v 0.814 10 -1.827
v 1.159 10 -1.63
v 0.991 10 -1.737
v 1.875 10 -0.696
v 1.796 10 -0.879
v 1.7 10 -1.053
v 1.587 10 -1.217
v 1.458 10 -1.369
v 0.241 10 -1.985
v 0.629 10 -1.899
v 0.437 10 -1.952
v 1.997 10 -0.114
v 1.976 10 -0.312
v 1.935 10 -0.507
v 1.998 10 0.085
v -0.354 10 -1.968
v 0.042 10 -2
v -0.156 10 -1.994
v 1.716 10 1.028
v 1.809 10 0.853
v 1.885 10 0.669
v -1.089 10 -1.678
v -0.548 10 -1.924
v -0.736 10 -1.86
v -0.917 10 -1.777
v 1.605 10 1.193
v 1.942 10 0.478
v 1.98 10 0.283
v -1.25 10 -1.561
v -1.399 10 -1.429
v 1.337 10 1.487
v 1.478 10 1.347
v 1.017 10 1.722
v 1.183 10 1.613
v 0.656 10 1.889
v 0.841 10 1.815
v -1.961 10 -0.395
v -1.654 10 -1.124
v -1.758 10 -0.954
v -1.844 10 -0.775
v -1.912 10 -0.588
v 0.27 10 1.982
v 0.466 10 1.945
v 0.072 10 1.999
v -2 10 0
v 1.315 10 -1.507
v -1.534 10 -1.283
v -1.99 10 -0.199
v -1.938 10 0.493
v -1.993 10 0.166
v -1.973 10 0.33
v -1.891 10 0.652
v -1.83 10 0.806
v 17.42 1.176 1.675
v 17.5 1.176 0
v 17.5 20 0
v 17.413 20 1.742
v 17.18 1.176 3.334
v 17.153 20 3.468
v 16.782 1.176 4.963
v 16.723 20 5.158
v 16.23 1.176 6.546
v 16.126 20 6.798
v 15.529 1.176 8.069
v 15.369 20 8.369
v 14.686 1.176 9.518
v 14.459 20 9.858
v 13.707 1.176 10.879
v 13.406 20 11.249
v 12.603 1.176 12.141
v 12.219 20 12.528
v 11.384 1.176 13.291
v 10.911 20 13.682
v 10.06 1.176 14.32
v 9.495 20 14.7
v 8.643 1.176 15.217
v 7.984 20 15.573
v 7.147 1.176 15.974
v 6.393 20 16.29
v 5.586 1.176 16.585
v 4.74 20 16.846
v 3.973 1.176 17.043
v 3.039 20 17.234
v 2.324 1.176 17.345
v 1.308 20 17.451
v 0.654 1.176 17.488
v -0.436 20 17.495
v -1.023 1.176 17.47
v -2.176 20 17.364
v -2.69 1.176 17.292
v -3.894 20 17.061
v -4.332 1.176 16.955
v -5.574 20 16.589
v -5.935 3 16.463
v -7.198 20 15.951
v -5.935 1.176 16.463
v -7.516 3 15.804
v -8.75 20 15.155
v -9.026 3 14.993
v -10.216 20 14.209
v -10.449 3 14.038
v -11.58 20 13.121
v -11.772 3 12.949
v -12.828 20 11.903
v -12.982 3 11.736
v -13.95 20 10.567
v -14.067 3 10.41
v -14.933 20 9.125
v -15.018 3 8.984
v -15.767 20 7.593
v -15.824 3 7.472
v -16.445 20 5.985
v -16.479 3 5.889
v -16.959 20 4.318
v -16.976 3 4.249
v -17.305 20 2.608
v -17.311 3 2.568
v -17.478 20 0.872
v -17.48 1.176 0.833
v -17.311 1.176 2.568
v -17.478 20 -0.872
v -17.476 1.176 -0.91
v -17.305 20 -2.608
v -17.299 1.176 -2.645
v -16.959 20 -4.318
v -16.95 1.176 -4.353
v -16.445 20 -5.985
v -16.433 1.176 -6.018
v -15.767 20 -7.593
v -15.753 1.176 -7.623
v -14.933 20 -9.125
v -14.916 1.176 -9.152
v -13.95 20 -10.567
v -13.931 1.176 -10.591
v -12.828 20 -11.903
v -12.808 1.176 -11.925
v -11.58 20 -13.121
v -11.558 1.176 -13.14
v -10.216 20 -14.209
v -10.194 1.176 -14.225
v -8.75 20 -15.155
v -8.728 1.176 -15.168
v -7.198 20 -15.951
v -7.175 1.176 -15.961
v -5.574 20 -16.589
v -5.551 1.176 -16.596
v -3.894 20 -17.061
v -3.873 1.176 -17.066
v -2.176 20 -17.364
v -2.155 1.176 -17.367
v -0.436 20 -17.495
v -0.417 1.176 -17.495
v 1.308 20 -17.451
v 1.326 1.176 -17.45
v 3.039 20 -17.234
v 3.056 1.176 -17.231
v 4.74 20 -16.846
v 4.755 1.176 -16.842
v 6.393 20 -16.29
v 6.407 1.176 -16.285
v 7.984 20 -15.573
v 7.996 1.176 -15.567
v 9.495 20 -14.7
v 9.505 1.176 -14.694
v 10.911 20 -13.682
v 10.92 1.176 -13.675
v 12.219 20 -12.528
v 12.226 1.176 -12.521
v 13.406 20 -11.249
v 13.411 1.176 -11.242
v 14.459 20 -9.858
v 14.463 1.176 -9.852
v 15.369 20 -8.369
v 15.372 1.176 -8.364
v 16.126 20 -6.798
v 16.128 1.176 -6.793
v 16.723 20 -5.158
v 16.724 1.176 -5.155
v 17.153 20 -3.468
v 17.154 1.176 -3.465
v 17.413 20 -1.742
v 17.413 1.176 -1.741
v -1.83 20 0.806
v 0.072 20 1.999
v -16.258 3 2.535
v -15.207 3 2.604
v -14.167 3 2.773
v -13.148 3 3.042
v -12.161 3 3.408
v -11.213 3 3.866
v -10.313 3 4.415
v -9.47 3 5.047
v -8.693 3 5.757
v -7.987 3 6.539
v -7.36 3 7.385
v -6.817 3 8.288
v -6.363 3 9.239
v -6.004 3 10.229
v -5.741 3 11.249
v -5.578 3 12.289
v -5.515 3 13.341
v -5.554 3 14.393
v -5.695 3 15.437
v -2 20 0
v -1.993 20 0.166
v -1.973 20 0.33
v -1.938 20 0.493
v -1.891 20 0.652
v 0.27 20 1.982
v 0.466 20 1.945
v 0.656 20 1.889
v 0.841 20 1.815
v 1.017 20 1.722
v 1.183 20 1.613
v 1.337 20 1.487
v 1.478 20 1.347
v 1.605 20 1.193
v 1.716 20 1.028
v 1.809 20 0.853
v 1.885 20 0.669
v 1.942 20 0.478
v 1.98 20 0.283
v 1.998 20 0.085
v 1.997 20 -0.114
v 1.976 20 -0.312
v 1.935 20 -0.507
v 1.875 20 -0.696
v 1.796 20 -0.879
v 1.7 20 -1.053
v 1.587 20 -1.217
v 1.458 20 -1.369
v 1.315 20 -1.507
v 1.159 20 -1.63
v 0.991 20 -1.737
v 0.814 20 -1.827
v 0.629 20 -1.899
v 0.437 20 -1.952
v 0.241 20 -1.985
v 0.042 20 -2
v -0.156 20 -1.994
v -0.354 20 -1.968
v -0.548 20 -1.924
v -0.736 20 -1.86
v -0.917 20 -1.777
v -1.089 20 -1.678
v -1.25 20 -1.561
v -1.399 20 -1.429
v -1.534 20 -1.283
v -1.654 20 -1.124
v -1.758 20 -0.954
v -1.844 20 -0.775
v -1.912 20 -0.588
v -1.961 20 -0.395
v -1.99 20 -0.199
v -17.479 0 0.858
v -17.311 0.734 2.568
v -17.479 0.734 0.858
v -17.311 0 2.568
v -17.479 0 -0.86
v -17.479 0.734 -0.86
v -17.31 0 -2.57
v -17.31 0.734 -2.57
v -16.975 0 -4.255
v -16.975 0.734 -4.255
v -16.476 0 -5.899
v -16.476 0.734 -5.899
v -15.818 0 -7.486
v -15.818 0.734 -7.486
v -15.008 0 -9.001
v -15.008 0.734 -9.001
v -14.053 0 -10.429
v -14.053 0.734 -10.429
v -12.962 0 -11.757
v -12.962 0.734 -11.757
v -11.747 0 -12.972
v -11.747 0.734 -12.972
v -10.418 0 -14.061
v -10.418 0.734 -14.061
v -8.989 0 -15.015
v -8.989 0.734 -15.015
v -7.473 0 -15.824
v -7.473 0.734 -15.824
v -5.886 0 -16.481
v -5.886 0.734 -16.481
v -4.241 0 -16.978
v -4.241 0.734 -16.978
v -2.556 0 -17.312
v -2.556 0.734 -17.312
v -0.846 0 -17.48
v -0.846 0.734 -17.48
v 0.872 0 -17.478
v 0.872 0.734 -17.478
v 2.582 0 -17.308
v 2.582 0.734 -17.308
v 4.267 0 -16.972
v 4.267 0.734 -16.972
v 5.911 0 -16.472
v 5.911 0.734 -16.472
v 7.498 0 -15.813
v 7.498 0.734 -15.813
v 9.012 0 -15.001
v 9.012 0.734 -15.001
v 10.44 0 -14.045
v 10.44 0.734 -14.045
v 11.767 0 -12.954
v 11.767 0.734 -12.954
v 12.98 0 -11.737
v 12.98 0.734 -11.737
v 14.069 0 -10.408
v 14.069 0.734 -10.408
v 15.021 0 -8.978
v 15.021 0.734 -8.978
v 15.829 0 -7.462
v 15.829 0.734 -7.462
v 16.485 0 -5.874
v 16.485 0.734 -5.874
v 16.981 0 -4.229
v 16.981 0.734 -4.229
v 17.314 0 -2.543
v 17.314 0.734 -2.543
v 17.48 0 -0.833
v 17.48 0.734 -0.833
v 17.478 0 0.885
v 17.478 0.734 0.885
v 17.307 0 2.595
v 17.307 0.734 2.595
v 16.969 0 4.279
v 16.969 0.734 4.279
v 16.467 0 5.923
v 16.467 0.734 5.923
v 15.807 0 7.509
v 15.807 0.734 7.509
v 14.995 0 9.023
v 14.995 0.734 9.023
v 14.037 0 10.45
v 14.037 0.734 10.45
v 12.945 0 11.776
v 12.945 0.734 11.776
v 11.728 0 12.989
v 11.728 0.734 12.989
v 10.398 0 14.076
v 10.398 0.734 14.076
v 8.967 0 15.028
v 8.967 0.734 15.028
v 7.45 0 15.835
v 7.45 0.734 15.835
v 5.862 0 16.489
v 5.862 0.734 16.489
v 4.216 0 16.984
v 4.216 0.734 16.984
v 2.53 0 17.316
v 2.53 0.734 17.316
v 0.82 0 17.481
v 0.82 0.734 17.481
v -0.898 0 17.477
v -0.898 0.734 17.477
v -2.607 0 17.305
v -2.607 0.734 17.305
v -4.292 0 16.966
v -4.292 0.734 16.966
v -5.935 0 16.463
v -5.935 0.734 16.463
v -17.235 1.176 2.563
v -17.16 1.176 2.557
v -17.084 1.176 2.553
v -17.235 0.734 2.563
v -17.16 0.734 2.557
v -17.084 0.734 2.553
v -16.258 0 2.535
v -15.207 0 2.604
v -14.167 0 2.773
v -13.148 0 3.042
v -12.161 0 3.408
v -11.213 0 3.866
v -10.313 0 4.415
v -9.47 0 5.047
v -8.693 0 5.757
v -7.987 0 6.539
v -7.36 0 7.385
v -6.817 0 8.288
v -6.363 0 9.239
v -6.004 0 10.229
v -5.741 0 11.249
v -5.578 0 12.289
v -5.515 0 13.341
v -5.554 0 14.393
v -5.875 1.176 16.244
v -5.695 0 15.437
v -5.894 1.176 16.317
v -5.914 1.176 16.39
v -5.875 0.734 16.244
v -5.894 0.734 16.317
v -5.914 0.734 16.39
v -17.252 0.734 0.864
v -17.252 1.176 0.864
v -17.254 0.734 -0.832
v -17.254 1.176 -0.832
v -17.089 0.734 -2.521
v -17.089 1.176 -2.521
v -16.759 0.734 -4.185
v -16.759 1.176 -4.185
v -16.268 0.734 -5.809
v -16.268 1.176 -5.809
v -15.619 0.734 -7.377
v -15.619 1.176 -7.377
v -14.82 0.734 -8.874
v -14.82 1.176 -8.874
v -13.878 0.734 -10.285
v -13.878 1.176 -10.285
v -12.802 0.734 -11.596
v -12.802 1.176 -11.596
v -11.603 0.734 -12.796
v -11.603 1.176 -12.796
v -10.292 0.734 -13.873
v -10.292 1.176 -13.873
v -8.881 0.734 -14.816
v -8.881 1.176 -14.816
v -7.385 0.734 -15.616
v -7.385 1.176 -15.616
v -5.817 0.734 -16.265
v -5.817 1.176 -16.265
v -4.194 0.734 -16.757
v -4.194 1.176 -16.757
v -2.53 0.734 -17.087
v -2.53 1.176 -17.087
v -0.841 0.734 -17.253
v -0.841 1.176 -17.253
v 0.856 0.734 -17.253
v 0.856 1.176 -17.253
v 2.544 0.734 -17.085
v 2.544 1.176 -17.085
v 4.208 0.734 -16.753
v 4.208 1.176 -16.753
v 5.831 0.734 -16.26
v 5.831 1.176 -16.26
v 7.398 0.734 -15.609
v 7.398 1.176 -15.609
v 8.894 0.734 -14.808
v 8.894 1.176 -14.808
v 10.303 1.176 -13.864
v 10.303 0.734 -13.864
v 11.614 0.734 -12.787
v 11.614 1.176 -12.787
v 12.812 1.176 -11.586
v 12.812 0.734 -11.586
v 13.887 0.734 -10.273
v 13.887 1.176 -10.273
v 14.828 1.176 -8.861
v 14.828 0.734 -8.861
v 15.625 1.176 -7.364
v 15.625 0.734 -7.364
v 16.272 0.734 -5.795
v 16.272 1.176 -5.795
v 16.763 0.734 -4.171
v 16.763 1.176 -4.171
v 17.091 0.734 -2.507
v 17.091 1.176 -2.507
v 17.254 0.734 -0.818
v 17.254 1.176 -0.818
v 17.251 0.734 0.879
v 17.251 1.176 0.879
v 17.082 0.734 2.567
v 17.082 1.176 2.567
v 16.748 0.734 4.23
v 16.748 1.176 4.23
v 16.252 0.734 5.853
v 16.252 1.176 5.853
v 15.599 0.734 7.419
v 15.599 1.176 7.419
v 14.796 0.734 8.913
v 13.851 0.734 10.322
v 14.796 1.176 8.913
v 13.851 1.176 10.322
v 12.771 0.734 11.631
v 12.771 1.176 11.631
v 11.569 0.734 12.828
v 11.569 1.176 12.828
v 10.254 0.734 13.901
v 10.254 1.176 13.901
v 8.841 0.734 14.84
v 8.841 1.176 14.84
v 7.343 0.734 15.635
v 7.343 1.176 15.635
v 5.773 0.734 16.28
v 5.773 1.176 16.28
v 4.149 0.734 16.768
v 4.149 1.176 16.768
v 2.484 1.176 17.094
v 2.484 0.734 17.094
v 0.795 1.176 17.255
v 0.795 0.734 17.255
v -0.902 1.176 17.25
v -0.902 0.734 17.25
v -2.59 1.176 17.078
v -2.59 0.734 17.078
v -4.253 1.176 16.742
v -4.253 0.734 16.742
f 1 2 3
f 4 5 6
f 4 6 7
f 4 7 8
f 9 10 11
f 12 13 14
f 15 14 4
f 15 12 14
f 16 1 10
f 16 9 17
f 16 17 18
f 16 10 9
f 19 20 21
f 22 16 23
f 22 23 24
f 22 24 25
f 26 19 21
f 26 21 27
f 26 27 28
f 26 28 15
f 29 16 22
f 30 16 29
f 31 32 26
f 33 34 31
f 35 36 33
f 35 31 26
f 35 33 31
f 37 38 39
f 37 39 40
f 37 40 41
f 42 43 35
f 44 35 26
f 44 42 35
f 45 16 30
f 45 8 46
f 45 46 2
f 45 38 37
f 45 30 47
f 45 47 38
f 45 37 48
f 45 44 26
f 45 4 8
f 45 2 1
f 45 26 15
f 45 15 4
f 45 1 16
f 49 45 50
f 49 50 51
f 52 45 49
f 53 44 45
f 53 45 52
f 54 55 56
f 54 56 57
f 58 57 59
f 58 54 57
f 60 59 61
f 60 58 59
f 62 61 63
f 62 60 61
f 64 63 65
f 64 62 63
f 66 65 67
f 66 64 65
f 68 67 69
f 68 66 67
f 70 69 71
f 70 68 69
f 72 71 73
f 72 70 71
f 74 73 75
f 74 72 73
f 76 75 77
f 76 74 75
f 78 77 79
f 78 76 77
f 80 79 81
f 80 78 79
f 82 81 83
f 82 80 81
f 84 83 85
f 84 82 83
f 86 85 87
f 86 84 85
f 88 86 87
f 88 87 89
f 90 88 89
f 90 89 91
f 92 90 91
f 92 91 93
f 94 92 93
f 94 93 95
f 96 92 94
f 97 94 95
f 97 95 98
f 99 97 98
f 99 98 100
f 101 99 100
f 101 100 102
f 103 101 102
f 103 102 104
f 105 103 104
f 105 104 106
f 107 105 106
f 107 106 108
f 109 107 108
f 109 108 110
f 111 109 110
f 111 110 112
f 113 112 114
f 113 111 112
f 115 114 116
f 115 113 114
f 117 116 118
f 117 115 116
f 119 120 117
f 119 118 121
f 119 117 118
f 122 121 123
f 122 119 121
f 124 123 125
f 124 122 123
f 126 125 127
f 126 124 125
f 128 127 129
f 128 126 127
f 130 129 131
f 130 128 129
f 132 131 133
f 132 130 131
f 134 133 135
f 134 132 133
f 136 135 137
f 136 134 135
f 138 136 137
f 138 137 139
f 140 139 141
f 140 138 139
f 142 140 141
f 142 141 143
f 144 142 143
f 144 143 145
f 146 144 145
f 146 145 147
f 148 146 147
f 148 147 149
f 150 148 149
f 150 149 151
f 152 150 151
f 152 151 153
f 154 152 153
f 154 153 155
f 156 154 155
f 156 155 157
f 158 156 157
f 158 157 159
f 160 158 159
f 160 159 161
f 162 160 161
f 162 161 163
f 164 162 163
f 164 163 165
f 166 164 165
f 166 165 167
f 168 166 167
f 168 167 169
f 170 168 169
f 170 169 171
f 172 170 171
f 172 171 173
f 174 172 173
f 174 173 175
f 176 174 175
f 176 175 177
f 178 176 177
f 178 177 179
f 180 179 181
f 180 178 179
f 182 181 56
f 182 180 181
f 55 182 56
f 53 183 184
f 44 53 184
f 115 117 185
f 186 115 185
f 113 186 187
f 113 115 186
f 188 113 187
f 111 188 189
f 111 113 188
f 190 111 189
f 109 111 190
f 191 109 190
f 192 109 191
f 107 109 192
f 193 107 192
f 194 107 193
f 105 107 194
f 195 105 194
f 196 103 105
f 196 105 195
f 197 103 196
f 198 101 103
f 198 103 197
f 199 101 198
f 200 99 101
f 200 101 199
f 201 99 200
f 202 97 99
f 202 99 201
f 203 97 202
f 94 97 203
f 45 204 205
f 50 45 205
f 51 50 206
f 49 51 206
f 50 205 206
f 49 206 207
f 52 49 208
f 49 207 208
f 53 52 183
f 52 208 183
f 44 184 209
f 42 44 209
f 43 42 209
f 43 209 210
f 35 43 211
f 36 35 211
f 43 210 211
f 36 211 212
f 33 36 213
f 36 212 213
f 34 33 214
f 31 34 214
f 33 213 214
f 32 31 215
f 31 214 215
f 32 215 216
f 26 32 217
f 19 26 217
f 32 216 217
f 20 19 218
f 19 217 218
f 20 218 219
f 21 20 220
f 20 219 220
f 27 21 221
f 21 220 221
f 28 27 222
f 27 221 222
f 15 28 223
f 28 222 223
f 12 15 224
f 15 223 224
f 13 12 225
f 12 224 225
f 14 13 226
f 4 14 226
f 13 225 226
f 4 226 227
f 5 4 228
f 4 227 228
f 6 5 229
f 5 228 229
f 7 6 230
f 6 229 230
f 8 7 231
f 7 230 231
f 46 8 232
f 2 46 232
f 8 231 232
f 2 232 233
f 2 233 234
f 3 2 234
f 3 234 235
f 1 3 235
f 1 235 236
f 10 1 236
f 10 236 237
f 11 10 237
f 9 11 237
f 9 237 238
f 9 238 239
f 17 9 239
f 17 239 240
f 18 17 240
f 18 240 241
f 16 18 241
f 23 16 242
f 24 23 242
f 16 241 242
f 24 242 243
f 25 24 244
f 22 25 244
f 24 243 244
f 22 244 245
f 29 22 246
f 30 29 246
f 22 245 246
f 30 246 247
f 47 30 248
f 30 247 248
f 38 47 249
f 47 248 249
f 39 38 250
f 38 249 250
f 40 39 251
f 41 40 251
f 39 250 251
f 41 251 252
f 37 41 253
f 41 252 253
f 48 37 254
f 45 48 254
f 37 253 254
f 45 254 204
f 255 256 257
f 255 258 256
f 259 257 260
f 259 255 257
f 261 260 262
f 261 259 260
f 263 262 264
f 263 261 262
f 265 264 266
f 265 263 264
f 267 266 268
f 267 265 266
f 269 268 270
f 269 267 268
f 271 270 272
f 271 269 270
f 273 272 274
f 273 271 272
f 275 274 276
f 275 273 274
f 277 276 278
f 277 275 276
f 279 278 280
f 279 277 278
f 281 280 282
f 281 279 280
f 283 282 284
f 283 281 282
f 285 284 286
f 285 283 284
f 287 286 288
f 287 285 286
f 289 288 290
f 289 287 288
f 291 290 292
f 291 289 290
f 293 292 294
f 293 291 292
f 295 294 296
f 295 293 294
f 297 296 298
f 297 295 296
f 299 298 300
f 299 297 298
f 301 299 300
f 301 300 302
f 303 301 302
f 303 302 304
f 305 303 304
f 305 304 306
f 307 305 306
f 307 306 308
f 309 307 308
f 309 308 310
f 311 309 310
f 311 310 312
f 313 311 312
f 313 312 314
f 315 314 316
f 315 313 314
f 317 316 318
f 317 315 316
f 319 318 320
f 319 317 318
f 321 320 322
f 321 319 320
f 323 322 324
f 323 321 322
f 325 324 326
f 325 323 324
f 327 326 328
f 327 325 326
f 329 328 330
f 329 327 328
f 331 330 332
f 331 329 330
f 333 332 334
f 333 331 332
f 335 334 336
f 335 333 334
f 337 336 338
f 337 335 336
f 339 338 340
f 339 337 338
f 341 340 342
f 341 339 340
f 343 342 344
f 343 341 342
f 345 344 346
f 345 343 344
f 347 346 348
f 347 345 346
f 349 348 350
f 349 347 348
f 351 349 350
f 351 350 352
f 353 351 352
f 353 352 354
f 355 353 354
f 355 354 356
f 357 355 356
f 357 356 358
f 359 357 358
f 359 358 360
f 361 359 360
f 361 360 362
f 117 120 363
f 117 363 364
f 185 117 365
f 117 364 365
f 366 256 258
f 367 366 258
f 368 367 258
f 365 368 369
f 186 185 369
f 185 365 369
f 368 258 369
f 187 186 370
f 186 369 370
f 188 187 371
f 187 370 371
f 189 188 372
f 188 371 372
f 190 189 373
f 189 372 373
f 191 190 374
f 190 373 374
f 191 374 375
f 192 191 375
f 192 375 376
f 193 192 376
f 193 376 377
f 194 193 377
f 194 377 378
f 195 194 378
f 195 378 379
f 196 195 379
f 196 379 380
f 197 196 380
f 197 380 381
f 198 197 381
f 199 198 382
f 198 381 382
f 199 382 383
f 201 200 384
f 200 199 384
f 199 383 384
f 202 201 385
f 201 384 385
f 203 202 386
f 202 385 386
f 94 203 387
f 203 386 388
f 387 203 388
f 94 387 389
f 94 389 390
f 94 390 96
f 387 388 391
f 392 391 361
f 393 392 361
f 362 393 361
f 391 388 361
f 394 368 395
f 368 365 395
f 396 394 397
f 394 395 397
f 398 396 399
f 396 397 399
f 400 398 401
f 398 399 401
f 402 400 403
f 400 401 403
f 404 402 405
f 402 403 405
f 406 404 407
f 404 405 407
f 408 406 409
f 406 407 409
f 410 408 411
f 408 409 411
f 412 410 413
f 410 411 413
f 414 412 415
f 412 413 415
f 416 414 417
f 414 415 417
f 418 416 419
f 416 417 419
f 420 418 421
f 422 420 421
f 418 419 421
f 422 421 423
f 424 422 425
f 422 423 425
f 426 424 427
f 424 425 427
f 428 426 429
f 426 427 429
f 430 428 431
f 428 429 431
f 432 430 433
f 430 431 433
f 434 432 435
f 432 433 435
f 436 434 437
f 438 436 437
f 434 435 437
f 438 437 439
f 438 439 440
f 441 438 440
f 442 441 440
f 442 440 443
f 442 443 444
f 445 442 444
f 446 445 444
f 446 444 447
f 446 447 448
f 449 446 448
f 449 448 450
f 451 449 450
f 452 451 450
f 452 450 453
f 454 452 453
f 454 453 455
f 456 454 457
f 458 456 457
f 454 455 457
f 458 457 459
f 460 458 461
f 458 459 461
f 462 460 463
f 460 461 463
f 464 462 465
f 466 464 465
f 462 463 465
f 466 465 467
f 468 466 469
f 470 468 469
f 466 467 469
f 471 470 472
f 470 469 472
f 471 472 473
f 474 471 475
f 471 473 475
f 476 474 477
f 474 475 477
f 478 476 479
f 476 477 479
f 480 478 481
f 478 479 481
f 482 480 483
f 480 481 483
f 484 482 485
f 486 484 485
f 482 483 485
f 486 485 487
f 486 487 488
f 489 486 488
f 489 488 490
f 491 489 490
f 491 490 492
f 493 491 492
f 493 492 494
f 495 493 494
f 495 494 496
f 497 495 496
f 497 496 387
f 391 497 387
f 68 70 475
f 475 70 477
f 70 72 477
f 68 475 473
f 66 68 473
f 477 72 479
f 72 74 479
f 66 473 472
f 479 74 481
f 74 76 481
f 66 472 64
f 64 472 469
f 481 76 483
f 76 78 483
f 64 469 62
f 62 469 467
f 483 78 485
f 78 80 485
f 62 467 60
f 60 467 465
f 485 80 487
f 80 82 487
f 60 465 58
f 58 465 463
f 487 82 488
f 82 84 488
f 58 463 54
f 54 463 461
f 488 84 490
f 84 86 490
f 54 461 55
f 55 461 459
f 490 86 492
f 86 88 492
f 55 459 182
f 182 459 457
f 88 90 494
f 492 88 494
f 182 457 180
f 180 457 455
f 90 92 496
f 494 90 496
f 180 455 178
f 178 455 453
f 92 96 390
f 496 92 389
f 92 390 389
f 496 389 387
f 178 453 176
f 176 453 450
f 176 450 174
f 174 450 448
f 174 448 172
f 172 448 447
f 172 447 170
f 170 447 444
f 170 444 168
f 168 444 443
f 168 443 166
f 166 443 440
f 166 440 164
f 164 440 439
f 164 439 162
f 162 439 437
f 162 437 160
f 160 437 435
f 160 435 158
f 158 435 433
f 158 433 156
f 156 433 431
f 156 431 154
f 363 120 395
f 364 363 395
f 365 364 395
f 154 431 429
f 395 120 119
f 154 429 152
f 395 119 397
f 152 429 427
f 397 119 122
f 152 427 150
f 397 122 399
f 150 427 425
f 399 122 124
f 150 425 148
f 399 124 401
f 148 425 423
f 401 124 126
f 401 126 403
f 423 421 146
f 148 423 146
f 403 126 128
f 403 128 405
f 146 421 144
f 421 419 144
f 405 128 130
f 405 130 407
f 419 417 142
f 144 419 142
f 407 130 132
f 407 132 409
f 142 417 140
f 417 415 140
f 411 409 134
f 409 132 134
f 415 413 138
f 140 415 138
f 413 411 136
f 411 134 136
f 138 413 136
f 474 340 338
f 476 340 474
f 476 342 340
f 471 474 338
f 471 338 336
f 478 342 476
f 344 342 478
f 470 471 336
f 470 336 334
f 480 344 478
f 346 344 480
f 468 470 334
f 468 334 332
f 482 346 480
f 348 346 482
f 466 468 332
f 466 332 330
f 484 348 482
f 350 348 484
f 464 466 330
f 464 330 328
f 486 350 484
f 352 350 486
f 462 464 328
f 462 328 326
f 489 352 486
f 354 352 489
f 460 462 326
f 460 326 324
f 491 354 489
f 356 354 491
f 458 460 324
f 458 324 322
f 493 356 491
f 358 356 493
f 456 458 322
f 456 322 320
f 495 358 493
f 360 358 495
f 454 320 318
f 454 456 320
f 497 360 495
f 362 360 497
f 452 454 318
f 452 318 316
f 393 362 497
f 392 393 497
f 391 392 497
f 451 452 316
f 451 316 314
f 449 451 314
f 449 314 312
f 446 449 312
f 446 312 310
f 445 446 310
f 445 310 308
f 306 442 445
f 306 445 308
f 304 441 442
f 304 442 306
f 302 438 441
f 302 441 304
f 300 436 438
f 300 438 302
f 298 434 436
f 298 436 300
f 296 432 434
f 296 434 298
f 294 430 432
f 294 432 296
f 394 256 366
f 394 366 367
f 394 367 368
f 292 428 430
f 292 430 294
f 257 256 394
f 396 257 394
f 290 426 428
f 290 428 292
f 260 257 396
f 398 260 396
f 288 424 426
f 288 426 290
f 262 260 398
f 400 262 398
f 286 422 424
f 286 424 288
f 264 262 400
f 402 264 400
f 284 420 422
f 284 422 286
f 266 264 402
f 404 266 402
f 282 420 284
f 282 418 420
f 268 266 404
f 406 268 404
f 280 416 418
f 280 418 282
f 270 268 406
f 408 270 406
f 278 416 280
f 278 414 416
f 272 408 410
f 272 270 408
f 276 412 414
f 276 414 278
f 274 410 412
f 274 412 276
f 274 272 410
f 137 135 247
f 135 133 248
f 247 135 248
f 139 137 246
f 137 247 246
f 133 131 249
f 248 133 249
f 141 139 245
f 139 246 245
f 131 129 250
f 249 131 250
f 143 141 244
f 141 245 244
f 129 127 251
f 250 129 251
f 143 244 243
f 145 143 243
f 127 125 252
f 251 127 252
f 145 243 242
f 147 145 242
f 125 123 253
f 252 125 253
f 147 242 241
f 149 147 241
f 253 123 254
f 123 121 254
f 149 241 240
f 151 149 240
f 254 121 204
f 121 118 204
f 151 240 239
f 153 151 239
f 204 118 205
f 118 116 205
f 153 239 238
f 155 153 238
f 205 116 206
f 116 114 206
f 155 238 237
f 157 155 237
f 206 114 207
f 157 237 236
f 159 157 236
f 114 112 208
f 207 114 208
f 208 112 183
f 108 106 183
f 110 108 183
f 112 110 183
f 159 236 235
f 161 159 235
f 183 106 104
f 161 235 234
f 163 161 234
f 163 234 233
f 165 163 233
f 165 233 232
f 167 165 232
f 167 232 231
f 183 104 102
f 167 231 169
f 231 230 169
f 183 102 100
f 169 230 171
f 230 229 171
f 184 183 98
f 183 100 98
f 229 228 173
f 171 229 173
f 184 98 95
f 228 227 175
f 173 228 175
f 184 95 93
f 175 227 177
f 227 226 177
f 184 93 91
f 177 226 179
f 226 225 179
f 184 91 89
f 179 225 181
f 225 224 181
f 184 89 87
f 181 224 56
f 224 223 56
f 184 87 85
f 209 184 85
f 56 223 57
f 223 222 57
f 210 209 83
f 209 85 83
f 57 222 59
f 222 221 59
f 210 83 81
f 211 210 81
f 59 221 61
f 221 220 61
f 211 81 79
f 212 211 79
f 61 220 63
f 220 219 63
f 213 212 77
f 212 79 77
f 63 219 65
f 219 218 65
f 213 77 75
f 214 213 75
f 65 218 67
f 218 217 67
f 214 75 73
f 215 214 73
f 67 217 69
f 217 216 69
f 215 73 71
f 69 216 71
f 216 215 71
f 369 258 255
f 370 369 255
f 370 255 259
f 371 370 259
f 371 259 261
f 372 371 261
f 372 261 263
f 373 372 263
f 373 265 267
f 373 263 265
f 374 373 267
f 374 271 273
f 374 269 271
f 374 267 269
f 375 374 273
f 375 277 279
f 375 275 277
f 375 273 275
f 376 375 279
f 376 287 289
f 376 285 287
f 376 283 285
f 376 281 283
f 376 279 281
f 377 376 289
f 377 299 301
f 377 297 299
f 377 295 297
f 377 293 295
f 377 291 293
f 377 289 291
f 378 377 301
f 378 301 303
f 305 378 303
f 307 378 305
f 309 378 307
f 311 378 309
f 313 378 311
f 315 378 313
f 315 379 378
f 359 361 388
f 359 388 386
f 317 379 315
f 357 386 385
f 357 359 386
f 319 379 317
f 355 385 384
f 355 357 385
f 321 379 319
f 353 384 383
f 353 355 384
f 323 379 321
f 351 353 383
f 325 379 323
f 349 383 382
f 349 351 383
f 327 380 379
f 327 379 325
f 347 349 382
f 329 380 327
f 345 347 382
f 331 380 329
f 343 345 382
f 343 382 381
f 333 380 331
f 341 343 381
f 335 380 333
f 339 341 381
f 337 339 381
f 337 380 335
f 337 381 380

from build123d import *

# Parameters (mm, degrees)
F0_R     = 17.5
F1_DEPTH = 20
F2_R     = 10.927748
F3_DEPTH = 3
F5_DEPTH = 10
F6_W     = 0.44194
F6_H     = 0.254811


with BuildPart() as f1:
    # F0 (on Front) → F1 (new body)
    with BuildSketch(Plane.XZ):
        Circle(F0_R)
    extrude(amount=-F1_DEPTH)

    # F2 (on Front) → F3 (cut)
    with BuildSketch(Plane.XZ):
        with Locations((-16.442308, 13.46154)):
            Circle(F2_R)
    extrude(amount=-F3_DEPTH, mode=Mode.SUBTRACT)

    # F4 (on face) → F5 (cut)
    with BuildSketch(Plane(origin=(0, 20, 0), x_dir=(-1, 0, 0), z_dir=(0, 1, 0))):
        with BuildLine():
            ThreePointArc((-0.071881, 1.998708), (-1.388567, -1.439403), (2, 0))
            ThreePointArc((2, 0), (1.957133, 0.411864), (1.830368, 0.806073))
            Line((1.830368, 0.806073), (-0.071881, 1.998708))
        make_face()
    extrude(amount=-F5_DEPTH, mode=Mode.SUBTRACT)

    # F6 (on Right) → F7 (revolve, cut)
    with BuildSketch(Plane.YZ):
        with Locations((0.954671, 17.401108)):
            Rectangle(F6_W, F6_H)
    revolve(axis=Axis((0, 0, 0), (0, -1, 0)), mode=Mode.SUBTRACT)


solid = f1.part
